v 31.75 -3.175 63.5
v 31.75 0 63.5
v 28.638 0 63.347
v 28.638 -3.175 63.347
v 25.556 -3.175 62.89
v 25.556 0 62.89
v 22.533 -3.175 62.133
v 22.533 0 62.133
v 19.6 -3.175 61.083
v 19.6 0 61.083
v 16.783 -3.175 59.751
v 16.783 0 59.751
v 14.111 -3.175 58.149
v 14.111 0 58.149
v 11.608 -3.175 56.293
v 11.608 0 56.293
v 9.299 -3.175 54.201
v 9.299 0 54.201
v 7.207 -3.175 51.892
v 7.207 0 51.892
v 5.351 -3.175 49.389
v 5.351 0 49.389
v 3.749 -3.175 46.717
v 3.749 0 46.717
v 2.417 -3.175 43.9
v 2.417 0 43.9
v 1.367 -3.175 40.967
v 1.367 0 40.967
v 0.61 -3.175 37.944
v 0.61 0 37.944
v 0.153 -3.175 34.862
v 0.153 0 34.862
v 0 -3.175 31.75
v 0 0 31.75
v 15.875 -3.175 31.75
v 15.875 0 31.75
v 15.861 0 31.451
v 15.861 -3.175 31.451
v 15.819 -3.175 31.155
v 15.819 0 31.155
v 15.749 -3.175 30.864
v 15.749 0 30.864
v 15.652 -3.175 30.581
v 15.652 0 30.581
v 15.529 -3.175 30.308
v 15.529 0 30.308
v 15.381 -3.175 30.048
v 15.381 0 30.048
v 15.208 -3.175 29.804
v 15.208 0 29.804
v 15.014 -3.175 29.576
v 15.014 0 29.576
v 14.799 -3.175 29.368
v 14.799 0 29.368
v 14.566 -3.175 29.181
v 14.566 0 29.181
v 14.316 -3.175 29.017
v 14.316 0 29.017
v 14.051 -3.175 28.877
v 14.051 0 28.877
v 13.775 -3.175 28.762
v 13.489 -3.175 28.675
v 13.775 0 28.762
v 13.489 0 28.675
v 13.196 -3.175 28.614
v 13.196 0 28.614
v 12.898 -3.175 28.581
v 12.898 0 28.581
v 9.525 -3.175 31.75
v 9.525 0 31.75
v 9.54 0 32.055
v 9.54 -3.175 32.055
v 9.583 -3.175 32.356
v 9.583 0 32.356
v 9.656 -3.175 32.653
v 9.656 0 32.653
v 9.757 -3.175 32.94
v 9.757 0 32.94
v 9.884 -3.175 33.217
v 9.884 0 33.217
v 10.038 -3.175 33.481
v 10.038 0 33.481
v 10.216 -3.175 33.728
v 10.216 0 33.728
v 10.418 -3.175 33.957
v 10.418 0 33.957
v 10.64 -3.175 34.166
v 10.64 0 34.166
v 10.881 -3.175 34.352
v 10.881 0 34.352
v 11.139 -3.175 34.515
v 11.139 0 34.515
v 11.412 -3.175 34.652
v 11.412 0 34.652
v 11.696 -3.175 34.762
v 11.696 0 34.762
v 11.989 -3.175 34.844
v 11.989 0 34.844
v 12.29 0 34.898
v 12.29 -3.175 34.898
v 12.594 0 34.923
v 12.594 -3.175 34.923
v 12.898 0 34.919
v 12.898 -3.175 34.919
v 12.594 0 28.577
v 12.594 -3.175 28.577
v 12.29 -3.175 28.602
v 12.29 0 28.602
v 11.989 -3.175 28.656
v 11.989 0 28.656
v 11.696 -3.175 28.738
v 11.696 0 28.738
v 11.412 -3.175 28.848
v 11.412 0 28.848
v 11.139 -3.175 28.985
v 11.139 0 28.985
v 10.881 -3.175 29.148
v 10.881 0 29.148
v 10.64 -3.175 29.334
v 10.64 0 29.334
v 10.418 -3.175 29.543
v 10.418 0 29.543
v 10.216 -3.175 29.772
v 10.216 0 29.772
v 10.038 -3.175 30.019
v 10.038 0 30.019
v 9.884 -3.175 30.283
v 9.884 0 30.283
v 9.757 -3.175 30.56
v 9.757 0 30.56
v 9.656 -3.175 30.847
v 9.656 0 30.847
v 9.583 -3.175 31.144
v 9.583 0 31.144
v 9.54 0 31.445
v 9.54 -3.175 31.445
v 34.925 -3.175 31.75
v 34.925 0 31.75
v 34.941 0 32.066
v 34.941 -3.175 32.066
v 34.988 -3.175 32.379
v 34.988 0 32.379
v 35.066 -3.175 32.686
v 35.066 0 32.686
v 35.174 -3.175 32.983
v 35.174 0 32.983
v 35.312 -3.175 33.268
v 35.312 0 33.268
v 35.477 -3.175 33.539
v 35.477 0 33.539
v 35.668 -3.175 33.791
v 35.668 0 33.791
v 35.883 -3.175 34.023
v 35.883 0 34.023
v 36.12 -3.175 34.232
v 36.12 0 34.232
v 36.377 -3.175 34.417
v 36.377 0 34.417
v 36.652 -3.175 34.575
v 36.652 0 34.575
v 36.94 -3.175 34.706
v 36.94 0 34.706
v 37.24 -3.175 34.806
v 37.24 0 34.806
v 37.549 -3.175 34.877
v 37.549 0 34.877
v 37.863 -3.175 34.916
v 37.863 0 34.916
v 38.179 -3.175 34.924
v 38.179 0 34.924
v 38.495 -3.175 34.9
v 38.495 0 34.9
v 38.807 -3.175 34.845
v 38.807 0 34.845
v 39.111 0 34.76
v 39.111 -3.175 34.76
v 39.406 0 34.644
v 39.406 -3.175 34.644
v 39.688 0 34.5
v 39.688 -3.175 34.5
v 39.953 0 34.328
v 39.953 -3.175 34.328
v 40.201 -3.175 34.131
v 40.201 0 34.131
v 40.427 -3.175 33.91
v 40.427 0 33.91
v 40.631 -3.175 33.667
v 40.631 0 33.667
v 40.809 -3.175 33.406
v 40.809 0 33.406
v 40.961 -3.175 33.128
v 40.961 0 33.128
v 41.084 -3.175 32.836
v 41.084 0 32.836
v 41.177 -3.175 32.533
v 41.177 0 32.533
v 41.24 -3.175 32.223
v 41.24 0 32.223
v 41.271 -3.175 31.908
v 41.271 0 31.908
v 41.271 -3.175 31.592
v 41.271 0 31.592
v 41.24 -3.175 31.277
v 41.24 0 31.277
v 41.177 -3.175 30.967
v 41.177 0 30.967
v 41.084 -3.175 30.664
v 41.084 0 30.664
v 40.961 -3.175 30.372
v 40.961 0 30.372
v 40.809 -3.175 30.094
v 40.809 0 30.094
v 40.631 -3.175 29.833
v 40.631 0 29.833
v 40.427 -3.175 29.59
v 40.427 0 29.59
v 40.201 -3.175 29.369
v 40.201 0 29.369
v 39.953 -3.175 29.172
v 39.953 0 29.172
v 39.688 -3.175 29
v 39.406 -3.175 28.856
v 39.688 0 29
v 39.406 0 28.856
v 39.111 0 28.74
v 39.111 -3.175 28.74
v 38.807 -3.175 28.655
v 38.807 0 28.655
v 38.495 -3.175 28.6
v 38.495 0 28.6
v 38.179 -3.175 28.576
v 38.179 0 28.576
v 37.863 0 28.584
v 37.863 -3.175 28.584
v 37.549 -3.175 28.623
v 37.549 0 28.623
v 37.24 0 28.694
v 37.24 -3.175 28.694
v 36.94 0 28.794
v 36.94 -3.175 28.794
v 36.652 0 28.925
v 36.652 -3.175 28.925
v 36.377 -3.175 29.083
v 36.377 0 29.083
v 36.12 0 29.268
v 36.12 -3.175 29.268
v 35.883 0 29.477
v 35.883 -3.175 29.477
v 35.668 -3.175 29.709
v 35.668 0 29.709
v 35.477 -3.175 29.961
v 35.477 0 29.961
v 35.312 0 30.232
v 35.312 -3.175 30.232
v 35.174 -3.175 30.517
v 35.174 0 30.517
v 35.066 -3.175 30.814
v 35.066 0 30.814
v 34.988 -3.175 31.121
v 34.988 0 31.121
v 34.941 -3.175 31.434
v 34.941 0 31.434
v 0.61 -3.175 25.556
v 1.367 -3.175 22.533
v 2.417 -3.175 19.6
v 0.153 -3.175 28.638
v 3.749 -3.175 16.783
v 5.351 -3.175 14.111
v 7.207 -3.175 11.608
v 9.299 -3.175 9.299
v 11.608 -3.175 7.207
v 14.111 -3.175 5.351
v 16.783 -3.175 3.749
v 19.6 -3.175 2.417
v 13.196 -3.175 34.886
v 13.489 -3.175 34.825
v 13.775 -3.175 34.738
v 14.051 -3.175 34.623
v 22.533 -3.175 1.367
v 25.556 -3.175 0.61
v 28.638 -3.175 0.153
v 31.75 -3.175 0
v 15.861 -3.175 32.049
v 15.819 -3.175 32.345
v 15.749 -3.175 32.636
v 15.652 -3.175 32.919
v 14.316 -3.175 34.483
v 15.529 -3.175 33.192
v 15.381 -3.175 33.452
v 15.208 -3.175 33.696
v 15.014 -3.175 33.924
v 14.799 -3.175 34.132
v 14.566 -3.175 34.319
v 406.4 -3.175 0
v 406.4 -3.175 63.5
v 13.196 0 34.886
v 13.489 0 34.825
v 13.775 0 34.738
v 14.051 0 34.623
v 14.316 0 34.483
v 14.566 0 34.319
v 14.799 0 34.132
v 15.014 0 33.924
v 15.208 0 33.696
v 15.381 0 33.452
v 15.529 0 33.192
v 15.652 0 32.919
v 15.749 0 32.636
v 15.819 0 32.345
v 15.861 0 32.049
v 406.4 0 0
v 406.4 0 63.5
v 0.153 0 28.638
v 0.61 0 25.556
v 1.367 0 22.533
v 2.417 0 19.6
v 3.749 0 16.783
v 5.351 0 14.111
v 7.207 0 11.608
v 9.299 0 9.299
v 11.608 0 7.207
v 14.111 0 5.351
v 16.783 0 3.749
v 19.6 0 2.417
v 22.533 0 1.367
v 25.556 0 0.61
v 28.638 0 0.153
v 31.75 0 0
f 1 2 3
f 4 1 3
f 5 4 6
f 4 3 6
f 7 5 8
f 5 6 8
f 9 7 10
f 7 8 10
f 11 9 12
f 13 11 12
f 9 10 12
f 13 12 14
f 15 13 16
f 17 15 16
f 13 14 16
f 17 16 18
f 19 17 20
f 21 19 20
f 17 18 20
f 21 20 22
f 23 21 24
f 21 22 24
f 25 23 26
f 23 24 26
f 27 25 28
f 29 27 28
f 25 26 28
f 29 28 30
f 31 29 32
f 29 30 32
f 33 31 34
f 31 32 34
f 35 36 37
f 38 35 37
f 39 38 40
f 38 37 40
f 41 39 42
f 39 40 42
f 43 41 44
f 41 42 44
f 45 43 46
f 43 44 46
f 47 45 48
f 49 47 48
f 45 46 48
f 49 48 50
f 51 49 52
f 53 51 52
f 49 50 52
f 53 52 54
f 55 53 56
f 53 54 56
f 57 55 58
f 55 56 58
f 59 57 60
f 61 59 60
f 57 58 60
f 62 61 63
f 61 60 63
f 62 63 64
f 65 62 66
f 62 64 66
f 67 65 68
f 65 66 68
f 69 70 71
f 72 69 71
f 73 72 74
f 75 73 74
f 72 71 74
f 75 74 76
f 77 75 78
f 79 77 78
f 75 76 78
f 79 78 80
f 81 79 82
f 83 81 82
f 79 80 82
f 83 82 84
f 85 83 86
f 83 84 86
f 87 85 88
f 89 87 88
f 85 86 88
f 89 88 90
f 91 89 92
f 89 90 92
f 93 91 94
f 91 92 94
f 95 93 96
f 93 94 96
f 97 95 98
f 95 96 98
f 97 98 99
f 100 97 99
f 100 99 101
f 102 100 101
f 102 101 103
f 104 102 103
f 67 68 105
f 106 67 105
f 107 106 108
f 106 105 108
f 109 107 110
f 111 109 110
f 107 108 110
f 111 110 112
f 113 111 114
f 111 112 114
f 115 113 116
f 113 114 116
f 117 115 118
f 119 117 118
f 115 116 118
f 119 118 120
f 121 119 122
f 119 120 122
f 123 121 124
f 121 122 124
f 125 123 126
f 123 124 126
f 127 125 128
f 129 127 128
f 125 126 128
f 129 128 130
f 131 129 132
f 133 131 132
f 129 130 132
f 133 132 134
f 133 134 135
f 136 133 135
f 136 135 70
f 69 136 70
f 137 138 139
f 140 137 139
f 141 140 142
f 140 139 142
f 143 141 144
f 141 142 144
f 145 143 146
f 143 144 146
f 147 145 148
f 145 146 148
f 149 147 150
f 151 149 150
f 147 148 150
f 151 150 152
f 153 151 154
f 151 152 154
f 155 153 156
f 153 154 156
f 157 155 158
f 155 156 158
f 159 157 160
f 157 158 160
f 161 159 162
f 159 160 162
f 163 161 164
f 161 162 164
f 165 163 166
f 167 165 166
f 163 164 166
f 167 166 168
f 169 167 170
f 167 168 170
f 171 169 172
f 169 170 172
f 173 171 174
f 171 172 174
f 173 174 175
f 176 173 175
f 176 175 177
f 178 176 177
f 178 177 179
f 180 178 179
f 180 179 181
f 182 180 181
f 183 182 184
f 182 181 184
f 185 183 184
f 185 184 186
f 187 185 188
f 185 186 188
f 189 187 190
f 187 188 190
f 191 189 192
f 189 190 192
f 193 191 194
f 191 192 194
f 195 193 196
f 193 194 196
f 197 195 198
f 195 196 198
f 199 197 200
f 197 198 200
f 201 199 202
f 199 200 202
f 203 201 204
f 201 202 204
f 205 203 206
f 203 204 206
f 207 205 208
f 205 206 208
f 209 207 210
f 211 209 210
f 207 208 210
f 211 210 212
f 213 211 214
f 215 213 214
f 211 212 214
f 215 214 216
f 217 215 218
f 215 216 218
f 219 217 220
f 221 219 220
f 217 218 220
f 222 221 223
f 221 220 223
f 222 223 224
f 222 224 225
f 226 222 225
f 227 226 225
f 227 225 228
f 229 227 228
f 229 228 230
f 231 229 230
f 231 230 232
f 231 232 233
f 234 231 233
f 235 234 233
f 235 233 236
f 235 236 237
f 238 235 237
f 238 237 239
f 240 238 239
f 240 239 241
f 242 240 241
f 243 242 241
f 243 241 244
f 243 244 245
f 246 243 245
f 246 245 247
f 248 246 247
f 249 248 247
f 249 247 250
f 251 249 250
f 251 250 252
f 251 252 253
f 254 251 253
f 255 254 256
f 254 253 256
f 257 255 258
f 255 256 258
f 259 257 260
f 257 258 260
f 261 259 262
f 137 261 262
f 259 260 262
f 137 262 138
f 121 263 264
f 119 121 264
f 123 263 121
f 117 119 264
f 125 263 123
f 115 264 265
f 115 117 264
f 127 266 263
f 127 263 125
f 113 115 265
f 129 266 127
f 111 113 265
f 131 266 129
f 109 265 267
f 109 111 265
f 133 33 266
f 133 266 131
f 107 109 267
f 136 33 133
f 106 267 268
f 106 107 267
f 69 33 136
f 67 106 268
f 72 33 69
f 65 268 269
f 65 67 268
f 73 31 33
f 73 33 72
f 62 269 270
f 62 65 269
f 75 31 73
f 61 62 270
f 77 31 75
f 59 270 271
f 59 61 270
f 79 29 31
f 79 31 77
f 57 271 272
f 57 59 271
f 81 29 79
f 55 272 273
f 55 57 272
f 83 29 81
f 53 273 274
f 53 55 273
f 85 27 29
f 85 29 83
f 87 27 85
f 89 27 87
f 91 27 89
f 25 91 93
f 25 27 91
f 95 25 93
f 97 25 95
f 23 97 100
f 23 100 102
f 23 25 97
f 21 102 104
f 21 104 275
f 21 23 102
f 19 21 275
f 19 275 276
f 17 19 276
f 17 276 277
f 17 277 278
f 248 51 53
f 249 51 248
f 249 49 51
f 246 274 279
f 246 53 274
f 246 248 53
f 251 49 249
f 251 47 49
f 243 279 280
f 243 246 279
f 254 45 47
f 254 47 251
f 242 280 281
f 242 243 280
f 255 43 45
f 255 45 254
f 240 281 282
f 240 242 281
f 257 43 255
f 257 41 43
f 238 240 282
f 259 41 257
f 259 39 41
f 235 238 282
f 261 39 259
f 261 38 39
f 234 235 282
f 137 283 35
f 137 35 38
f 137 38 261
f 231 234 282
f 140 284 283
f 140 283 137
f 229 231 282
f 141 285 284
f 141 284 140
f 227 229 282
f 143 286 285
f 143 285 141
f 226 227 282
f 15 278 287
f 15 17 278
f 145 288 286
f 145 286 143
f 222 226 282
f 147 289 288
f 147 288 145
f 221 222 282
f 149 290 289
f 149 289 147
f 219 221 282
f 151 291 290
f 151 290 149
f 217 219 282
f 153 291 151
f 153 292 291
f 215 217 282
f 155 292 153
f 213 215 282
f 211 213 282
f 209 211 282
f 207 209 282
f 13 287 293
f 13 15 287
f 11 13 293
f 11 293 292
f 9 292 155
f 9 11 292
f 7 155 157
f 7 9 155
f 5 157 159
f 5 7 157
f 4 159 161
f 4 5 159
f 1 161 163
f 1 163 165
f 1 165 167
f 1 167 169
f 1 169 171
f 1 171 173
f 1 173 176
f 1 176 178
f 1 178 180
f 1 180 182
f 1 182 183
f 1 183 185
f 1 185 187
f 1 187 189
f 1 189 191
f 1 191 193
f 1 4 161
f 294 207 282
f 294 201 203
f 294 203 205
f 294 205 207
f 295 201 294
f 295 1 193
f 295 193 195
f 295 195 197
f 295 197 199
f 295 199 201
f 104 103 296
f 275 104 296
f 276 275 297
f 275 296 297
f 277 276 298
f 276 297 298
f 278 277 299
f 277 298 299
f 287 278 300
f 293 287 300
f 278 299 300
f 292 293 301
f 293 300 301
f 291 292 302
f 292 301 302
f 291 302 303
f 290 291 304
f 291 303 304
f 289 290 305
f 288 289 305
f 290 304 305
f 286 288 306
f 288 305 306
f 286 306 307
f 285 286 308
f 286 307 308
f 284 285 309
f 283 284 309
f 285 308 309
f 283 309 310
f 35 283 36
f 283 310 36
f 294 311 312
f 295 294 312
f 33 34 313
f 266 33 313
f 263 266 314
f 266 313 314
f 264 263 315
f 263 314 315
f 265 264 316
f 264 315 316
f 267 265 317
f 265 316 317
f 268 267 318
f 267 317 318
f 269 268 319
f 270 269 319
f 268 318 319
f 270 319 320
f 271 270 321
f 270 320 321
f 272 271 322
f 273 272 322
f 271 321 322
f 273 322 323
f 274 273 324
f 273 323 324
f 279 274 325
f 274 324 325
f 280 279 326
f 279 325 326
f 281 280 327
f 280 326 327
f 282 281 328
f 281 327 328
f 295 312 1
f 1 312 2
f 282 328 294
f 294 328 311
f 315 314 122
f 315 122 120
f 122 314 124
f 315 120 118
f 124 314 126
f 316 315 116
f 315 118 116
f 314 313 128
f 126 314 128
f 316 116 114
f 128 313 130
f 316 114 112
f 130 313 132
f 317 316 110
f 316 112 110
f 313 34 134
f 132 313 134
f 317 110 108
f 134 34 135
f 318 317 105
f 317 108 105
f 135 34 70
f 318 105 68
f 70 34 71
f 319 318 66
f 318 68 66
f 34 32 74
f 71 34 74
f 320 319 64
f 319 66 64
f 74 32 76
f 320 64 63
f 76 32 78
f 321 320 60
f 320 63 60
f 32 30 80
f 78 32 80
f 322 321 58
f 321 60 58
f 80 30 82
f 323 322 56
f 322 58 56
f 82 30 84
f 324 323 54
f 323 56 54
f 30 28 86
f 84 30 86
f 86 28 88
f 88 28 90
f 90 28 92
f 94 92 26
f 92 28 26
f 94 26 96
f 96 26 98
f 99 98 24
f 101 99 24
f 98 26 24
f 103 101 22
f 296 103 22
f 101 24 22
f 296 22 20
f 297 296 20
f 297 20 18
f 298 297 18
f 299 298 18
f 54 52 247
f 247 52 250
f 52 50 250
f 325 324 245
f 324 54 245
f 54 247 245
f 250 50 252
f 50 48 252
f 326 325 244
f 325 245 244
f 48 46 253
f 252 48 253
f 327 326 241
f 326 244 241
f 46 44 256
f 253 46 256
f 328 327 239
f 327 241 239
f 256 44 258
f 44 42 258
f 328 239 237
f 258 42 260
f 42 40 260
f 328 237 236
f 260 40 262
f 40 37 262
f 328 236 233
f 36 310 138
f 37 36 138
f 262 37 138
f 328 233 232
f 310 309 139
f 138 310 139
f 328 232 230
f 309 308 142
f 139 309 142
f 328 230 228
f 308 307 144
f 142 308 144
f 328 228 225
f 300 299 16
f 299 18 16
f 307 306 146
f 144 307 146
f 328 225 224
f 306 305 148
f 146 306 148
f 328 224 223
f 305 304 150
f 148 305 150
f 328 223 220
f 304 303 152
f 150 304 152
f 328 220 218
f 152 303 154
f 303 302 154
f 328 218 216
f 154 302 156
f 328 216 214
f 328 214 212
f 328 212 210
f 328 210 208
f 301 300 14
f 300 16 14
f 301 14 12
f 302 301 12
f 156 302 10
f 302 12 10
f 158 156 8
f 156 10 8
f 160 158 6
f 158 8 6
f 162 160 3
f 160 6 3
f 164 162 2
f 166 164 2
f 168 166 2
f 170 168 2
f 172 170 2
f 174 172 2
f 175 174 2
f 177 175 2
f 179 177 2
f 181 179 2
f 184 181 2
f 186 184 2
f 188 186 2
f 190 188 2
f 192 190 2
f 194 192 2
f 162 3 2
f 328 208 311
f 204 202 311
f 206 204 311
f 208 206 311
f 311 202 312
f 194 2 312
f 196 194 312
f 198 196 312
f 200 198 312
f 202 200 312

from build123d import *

# Parameters (mm, degrees)
F1_DEPTH = 3.175


# Not quite as in the source:
# - a feature names something its author has since deleted; it is built from what else it names


with BuildPart() as f1:
    # F0 (on Front) → F1 (new body)
    with BuildSketch(Plane.XZ):
        with BuildLine():
            ThreePointArc((0, 31.75), (9.2993596973, 9.2993596973), (31.75, 0))
            Line((31.75, 0), (329.6745226565, 0))
            ThreePointArc((329.6745226565, 0), (322.395318302, 11.9320738166), (318.7033258065, 25.4128153768))
            ThreePointArc((318.7033258065, 25.4128153768), (311.9501, 31.75), (318.7033258065, 38.0871846232))
            ThreePointArc((318.7033258065, 38.0871846232), (322.395318302, 51.5679261834), (329.6745226565, 63.5))
            Line((329.6745226565, 63.5), (31.75, 63.5))
            ThreePointArc((31.75, 63.5), (9.2993596973, 54.2006403027), (0, 31.75))
        make_face()
        with BuildLine():
            ThreePointArc((12.8984375, 28.5812072396), (10.5262260999, 29.4358409667), (9.525, 31.75))
            ThreePointArc((9.525, 31.75), (10.5262260999, 34.0641590333), (12.8984375, 34.9187927604))
            ThreePointArc((12.8984375, 34.9187927604), (39.6875, 57.1003420835), (63.5, 31.75))
            ThreePointArc((63.5, 31.75), (39.6875, 6.3996579165), (12.8984375, 28.5812072396))
        make_face(mode=Mode.SUBTRACT)
        with BuildLine():
            ThreePointArc((318.7033258065, 25.4128153768), (322.395318302, 11.9320738166), (329.6745226565, 0))
            Line((329.6745226565, 0), (406.4, 0))
            Line((406.4, 0), (406.4, 63.5))
            Line((406.4, 63.5), (329.6745226565, 63.5))
            ThreePointArc((329.6745226565, 63.5), (322.395318302, 51.5679261834), (318.7033258065, 38.0871846232))
            ThreePointArc((318.7033258065, 38.0871846232), (322.9305958628, 36.0952281948), (324.6501, 31.75))
            ThreePointArc((324.6501, 31.75), (322.9305958628, 27.4047718052), (318.7033258065, 25.4128153768))
        make_face()
        with BuildLine():
            ThreePointArc((63.5, 31.75), (39.6875, 57.1003420835), (12.8984375, 34.9187927604))
            ThreePointArc((12.8984375, 34.9187927604), (15.0141590333, 33.9237739001), (15.875, 31.75))
            ThreePointArc((15.875, 31.75), (15.0141590333, 29.5762260999), (12.8984375, 28.5812072396))
            ThreePointArc((12.8984375, 28.5812072396), (39.6875, 6.3996579165), (63.5, 31.75))
        make_face()
        with BuildLine():
            ThreePointArc((41.275, 31.75), (38.1, 28.575), (34.925, 31.75))
            ThreePointArc((34.925, 31.75), (38.1, 34.925), (41.275, 31.75))
        make_face(mode=Mode.SUBTRACT)
        with BuildLine():
            ThreePointArc((318.7033258065, 38.0871846232), (311.9501, 31.75), (318.7033258065, 25.4128153768))
            ThreePointArc((318.7033258065, 25.4128153768), (318.3001, 31.75), (318.7033258065, 38.0871846232))
        make_face()
        with BuildLine():
            ThreePointArc((318.7033258065, 38.0871846232), (318.3001, 31.75), (318.7033258065, 25.4128153768))
            ThreePointArc((318.7033258065, 25.4128153768), (322.9305958628, 27.4047718052), (324.6501, 31.75))
            ThreePointArc((324.6501, 31.75), (322.9305958628, 36.0952281948), (318.7033258065, 38.0871846232))
        make_face()
    extrude(amount=F1_DEPTH)


solid = f1.part
